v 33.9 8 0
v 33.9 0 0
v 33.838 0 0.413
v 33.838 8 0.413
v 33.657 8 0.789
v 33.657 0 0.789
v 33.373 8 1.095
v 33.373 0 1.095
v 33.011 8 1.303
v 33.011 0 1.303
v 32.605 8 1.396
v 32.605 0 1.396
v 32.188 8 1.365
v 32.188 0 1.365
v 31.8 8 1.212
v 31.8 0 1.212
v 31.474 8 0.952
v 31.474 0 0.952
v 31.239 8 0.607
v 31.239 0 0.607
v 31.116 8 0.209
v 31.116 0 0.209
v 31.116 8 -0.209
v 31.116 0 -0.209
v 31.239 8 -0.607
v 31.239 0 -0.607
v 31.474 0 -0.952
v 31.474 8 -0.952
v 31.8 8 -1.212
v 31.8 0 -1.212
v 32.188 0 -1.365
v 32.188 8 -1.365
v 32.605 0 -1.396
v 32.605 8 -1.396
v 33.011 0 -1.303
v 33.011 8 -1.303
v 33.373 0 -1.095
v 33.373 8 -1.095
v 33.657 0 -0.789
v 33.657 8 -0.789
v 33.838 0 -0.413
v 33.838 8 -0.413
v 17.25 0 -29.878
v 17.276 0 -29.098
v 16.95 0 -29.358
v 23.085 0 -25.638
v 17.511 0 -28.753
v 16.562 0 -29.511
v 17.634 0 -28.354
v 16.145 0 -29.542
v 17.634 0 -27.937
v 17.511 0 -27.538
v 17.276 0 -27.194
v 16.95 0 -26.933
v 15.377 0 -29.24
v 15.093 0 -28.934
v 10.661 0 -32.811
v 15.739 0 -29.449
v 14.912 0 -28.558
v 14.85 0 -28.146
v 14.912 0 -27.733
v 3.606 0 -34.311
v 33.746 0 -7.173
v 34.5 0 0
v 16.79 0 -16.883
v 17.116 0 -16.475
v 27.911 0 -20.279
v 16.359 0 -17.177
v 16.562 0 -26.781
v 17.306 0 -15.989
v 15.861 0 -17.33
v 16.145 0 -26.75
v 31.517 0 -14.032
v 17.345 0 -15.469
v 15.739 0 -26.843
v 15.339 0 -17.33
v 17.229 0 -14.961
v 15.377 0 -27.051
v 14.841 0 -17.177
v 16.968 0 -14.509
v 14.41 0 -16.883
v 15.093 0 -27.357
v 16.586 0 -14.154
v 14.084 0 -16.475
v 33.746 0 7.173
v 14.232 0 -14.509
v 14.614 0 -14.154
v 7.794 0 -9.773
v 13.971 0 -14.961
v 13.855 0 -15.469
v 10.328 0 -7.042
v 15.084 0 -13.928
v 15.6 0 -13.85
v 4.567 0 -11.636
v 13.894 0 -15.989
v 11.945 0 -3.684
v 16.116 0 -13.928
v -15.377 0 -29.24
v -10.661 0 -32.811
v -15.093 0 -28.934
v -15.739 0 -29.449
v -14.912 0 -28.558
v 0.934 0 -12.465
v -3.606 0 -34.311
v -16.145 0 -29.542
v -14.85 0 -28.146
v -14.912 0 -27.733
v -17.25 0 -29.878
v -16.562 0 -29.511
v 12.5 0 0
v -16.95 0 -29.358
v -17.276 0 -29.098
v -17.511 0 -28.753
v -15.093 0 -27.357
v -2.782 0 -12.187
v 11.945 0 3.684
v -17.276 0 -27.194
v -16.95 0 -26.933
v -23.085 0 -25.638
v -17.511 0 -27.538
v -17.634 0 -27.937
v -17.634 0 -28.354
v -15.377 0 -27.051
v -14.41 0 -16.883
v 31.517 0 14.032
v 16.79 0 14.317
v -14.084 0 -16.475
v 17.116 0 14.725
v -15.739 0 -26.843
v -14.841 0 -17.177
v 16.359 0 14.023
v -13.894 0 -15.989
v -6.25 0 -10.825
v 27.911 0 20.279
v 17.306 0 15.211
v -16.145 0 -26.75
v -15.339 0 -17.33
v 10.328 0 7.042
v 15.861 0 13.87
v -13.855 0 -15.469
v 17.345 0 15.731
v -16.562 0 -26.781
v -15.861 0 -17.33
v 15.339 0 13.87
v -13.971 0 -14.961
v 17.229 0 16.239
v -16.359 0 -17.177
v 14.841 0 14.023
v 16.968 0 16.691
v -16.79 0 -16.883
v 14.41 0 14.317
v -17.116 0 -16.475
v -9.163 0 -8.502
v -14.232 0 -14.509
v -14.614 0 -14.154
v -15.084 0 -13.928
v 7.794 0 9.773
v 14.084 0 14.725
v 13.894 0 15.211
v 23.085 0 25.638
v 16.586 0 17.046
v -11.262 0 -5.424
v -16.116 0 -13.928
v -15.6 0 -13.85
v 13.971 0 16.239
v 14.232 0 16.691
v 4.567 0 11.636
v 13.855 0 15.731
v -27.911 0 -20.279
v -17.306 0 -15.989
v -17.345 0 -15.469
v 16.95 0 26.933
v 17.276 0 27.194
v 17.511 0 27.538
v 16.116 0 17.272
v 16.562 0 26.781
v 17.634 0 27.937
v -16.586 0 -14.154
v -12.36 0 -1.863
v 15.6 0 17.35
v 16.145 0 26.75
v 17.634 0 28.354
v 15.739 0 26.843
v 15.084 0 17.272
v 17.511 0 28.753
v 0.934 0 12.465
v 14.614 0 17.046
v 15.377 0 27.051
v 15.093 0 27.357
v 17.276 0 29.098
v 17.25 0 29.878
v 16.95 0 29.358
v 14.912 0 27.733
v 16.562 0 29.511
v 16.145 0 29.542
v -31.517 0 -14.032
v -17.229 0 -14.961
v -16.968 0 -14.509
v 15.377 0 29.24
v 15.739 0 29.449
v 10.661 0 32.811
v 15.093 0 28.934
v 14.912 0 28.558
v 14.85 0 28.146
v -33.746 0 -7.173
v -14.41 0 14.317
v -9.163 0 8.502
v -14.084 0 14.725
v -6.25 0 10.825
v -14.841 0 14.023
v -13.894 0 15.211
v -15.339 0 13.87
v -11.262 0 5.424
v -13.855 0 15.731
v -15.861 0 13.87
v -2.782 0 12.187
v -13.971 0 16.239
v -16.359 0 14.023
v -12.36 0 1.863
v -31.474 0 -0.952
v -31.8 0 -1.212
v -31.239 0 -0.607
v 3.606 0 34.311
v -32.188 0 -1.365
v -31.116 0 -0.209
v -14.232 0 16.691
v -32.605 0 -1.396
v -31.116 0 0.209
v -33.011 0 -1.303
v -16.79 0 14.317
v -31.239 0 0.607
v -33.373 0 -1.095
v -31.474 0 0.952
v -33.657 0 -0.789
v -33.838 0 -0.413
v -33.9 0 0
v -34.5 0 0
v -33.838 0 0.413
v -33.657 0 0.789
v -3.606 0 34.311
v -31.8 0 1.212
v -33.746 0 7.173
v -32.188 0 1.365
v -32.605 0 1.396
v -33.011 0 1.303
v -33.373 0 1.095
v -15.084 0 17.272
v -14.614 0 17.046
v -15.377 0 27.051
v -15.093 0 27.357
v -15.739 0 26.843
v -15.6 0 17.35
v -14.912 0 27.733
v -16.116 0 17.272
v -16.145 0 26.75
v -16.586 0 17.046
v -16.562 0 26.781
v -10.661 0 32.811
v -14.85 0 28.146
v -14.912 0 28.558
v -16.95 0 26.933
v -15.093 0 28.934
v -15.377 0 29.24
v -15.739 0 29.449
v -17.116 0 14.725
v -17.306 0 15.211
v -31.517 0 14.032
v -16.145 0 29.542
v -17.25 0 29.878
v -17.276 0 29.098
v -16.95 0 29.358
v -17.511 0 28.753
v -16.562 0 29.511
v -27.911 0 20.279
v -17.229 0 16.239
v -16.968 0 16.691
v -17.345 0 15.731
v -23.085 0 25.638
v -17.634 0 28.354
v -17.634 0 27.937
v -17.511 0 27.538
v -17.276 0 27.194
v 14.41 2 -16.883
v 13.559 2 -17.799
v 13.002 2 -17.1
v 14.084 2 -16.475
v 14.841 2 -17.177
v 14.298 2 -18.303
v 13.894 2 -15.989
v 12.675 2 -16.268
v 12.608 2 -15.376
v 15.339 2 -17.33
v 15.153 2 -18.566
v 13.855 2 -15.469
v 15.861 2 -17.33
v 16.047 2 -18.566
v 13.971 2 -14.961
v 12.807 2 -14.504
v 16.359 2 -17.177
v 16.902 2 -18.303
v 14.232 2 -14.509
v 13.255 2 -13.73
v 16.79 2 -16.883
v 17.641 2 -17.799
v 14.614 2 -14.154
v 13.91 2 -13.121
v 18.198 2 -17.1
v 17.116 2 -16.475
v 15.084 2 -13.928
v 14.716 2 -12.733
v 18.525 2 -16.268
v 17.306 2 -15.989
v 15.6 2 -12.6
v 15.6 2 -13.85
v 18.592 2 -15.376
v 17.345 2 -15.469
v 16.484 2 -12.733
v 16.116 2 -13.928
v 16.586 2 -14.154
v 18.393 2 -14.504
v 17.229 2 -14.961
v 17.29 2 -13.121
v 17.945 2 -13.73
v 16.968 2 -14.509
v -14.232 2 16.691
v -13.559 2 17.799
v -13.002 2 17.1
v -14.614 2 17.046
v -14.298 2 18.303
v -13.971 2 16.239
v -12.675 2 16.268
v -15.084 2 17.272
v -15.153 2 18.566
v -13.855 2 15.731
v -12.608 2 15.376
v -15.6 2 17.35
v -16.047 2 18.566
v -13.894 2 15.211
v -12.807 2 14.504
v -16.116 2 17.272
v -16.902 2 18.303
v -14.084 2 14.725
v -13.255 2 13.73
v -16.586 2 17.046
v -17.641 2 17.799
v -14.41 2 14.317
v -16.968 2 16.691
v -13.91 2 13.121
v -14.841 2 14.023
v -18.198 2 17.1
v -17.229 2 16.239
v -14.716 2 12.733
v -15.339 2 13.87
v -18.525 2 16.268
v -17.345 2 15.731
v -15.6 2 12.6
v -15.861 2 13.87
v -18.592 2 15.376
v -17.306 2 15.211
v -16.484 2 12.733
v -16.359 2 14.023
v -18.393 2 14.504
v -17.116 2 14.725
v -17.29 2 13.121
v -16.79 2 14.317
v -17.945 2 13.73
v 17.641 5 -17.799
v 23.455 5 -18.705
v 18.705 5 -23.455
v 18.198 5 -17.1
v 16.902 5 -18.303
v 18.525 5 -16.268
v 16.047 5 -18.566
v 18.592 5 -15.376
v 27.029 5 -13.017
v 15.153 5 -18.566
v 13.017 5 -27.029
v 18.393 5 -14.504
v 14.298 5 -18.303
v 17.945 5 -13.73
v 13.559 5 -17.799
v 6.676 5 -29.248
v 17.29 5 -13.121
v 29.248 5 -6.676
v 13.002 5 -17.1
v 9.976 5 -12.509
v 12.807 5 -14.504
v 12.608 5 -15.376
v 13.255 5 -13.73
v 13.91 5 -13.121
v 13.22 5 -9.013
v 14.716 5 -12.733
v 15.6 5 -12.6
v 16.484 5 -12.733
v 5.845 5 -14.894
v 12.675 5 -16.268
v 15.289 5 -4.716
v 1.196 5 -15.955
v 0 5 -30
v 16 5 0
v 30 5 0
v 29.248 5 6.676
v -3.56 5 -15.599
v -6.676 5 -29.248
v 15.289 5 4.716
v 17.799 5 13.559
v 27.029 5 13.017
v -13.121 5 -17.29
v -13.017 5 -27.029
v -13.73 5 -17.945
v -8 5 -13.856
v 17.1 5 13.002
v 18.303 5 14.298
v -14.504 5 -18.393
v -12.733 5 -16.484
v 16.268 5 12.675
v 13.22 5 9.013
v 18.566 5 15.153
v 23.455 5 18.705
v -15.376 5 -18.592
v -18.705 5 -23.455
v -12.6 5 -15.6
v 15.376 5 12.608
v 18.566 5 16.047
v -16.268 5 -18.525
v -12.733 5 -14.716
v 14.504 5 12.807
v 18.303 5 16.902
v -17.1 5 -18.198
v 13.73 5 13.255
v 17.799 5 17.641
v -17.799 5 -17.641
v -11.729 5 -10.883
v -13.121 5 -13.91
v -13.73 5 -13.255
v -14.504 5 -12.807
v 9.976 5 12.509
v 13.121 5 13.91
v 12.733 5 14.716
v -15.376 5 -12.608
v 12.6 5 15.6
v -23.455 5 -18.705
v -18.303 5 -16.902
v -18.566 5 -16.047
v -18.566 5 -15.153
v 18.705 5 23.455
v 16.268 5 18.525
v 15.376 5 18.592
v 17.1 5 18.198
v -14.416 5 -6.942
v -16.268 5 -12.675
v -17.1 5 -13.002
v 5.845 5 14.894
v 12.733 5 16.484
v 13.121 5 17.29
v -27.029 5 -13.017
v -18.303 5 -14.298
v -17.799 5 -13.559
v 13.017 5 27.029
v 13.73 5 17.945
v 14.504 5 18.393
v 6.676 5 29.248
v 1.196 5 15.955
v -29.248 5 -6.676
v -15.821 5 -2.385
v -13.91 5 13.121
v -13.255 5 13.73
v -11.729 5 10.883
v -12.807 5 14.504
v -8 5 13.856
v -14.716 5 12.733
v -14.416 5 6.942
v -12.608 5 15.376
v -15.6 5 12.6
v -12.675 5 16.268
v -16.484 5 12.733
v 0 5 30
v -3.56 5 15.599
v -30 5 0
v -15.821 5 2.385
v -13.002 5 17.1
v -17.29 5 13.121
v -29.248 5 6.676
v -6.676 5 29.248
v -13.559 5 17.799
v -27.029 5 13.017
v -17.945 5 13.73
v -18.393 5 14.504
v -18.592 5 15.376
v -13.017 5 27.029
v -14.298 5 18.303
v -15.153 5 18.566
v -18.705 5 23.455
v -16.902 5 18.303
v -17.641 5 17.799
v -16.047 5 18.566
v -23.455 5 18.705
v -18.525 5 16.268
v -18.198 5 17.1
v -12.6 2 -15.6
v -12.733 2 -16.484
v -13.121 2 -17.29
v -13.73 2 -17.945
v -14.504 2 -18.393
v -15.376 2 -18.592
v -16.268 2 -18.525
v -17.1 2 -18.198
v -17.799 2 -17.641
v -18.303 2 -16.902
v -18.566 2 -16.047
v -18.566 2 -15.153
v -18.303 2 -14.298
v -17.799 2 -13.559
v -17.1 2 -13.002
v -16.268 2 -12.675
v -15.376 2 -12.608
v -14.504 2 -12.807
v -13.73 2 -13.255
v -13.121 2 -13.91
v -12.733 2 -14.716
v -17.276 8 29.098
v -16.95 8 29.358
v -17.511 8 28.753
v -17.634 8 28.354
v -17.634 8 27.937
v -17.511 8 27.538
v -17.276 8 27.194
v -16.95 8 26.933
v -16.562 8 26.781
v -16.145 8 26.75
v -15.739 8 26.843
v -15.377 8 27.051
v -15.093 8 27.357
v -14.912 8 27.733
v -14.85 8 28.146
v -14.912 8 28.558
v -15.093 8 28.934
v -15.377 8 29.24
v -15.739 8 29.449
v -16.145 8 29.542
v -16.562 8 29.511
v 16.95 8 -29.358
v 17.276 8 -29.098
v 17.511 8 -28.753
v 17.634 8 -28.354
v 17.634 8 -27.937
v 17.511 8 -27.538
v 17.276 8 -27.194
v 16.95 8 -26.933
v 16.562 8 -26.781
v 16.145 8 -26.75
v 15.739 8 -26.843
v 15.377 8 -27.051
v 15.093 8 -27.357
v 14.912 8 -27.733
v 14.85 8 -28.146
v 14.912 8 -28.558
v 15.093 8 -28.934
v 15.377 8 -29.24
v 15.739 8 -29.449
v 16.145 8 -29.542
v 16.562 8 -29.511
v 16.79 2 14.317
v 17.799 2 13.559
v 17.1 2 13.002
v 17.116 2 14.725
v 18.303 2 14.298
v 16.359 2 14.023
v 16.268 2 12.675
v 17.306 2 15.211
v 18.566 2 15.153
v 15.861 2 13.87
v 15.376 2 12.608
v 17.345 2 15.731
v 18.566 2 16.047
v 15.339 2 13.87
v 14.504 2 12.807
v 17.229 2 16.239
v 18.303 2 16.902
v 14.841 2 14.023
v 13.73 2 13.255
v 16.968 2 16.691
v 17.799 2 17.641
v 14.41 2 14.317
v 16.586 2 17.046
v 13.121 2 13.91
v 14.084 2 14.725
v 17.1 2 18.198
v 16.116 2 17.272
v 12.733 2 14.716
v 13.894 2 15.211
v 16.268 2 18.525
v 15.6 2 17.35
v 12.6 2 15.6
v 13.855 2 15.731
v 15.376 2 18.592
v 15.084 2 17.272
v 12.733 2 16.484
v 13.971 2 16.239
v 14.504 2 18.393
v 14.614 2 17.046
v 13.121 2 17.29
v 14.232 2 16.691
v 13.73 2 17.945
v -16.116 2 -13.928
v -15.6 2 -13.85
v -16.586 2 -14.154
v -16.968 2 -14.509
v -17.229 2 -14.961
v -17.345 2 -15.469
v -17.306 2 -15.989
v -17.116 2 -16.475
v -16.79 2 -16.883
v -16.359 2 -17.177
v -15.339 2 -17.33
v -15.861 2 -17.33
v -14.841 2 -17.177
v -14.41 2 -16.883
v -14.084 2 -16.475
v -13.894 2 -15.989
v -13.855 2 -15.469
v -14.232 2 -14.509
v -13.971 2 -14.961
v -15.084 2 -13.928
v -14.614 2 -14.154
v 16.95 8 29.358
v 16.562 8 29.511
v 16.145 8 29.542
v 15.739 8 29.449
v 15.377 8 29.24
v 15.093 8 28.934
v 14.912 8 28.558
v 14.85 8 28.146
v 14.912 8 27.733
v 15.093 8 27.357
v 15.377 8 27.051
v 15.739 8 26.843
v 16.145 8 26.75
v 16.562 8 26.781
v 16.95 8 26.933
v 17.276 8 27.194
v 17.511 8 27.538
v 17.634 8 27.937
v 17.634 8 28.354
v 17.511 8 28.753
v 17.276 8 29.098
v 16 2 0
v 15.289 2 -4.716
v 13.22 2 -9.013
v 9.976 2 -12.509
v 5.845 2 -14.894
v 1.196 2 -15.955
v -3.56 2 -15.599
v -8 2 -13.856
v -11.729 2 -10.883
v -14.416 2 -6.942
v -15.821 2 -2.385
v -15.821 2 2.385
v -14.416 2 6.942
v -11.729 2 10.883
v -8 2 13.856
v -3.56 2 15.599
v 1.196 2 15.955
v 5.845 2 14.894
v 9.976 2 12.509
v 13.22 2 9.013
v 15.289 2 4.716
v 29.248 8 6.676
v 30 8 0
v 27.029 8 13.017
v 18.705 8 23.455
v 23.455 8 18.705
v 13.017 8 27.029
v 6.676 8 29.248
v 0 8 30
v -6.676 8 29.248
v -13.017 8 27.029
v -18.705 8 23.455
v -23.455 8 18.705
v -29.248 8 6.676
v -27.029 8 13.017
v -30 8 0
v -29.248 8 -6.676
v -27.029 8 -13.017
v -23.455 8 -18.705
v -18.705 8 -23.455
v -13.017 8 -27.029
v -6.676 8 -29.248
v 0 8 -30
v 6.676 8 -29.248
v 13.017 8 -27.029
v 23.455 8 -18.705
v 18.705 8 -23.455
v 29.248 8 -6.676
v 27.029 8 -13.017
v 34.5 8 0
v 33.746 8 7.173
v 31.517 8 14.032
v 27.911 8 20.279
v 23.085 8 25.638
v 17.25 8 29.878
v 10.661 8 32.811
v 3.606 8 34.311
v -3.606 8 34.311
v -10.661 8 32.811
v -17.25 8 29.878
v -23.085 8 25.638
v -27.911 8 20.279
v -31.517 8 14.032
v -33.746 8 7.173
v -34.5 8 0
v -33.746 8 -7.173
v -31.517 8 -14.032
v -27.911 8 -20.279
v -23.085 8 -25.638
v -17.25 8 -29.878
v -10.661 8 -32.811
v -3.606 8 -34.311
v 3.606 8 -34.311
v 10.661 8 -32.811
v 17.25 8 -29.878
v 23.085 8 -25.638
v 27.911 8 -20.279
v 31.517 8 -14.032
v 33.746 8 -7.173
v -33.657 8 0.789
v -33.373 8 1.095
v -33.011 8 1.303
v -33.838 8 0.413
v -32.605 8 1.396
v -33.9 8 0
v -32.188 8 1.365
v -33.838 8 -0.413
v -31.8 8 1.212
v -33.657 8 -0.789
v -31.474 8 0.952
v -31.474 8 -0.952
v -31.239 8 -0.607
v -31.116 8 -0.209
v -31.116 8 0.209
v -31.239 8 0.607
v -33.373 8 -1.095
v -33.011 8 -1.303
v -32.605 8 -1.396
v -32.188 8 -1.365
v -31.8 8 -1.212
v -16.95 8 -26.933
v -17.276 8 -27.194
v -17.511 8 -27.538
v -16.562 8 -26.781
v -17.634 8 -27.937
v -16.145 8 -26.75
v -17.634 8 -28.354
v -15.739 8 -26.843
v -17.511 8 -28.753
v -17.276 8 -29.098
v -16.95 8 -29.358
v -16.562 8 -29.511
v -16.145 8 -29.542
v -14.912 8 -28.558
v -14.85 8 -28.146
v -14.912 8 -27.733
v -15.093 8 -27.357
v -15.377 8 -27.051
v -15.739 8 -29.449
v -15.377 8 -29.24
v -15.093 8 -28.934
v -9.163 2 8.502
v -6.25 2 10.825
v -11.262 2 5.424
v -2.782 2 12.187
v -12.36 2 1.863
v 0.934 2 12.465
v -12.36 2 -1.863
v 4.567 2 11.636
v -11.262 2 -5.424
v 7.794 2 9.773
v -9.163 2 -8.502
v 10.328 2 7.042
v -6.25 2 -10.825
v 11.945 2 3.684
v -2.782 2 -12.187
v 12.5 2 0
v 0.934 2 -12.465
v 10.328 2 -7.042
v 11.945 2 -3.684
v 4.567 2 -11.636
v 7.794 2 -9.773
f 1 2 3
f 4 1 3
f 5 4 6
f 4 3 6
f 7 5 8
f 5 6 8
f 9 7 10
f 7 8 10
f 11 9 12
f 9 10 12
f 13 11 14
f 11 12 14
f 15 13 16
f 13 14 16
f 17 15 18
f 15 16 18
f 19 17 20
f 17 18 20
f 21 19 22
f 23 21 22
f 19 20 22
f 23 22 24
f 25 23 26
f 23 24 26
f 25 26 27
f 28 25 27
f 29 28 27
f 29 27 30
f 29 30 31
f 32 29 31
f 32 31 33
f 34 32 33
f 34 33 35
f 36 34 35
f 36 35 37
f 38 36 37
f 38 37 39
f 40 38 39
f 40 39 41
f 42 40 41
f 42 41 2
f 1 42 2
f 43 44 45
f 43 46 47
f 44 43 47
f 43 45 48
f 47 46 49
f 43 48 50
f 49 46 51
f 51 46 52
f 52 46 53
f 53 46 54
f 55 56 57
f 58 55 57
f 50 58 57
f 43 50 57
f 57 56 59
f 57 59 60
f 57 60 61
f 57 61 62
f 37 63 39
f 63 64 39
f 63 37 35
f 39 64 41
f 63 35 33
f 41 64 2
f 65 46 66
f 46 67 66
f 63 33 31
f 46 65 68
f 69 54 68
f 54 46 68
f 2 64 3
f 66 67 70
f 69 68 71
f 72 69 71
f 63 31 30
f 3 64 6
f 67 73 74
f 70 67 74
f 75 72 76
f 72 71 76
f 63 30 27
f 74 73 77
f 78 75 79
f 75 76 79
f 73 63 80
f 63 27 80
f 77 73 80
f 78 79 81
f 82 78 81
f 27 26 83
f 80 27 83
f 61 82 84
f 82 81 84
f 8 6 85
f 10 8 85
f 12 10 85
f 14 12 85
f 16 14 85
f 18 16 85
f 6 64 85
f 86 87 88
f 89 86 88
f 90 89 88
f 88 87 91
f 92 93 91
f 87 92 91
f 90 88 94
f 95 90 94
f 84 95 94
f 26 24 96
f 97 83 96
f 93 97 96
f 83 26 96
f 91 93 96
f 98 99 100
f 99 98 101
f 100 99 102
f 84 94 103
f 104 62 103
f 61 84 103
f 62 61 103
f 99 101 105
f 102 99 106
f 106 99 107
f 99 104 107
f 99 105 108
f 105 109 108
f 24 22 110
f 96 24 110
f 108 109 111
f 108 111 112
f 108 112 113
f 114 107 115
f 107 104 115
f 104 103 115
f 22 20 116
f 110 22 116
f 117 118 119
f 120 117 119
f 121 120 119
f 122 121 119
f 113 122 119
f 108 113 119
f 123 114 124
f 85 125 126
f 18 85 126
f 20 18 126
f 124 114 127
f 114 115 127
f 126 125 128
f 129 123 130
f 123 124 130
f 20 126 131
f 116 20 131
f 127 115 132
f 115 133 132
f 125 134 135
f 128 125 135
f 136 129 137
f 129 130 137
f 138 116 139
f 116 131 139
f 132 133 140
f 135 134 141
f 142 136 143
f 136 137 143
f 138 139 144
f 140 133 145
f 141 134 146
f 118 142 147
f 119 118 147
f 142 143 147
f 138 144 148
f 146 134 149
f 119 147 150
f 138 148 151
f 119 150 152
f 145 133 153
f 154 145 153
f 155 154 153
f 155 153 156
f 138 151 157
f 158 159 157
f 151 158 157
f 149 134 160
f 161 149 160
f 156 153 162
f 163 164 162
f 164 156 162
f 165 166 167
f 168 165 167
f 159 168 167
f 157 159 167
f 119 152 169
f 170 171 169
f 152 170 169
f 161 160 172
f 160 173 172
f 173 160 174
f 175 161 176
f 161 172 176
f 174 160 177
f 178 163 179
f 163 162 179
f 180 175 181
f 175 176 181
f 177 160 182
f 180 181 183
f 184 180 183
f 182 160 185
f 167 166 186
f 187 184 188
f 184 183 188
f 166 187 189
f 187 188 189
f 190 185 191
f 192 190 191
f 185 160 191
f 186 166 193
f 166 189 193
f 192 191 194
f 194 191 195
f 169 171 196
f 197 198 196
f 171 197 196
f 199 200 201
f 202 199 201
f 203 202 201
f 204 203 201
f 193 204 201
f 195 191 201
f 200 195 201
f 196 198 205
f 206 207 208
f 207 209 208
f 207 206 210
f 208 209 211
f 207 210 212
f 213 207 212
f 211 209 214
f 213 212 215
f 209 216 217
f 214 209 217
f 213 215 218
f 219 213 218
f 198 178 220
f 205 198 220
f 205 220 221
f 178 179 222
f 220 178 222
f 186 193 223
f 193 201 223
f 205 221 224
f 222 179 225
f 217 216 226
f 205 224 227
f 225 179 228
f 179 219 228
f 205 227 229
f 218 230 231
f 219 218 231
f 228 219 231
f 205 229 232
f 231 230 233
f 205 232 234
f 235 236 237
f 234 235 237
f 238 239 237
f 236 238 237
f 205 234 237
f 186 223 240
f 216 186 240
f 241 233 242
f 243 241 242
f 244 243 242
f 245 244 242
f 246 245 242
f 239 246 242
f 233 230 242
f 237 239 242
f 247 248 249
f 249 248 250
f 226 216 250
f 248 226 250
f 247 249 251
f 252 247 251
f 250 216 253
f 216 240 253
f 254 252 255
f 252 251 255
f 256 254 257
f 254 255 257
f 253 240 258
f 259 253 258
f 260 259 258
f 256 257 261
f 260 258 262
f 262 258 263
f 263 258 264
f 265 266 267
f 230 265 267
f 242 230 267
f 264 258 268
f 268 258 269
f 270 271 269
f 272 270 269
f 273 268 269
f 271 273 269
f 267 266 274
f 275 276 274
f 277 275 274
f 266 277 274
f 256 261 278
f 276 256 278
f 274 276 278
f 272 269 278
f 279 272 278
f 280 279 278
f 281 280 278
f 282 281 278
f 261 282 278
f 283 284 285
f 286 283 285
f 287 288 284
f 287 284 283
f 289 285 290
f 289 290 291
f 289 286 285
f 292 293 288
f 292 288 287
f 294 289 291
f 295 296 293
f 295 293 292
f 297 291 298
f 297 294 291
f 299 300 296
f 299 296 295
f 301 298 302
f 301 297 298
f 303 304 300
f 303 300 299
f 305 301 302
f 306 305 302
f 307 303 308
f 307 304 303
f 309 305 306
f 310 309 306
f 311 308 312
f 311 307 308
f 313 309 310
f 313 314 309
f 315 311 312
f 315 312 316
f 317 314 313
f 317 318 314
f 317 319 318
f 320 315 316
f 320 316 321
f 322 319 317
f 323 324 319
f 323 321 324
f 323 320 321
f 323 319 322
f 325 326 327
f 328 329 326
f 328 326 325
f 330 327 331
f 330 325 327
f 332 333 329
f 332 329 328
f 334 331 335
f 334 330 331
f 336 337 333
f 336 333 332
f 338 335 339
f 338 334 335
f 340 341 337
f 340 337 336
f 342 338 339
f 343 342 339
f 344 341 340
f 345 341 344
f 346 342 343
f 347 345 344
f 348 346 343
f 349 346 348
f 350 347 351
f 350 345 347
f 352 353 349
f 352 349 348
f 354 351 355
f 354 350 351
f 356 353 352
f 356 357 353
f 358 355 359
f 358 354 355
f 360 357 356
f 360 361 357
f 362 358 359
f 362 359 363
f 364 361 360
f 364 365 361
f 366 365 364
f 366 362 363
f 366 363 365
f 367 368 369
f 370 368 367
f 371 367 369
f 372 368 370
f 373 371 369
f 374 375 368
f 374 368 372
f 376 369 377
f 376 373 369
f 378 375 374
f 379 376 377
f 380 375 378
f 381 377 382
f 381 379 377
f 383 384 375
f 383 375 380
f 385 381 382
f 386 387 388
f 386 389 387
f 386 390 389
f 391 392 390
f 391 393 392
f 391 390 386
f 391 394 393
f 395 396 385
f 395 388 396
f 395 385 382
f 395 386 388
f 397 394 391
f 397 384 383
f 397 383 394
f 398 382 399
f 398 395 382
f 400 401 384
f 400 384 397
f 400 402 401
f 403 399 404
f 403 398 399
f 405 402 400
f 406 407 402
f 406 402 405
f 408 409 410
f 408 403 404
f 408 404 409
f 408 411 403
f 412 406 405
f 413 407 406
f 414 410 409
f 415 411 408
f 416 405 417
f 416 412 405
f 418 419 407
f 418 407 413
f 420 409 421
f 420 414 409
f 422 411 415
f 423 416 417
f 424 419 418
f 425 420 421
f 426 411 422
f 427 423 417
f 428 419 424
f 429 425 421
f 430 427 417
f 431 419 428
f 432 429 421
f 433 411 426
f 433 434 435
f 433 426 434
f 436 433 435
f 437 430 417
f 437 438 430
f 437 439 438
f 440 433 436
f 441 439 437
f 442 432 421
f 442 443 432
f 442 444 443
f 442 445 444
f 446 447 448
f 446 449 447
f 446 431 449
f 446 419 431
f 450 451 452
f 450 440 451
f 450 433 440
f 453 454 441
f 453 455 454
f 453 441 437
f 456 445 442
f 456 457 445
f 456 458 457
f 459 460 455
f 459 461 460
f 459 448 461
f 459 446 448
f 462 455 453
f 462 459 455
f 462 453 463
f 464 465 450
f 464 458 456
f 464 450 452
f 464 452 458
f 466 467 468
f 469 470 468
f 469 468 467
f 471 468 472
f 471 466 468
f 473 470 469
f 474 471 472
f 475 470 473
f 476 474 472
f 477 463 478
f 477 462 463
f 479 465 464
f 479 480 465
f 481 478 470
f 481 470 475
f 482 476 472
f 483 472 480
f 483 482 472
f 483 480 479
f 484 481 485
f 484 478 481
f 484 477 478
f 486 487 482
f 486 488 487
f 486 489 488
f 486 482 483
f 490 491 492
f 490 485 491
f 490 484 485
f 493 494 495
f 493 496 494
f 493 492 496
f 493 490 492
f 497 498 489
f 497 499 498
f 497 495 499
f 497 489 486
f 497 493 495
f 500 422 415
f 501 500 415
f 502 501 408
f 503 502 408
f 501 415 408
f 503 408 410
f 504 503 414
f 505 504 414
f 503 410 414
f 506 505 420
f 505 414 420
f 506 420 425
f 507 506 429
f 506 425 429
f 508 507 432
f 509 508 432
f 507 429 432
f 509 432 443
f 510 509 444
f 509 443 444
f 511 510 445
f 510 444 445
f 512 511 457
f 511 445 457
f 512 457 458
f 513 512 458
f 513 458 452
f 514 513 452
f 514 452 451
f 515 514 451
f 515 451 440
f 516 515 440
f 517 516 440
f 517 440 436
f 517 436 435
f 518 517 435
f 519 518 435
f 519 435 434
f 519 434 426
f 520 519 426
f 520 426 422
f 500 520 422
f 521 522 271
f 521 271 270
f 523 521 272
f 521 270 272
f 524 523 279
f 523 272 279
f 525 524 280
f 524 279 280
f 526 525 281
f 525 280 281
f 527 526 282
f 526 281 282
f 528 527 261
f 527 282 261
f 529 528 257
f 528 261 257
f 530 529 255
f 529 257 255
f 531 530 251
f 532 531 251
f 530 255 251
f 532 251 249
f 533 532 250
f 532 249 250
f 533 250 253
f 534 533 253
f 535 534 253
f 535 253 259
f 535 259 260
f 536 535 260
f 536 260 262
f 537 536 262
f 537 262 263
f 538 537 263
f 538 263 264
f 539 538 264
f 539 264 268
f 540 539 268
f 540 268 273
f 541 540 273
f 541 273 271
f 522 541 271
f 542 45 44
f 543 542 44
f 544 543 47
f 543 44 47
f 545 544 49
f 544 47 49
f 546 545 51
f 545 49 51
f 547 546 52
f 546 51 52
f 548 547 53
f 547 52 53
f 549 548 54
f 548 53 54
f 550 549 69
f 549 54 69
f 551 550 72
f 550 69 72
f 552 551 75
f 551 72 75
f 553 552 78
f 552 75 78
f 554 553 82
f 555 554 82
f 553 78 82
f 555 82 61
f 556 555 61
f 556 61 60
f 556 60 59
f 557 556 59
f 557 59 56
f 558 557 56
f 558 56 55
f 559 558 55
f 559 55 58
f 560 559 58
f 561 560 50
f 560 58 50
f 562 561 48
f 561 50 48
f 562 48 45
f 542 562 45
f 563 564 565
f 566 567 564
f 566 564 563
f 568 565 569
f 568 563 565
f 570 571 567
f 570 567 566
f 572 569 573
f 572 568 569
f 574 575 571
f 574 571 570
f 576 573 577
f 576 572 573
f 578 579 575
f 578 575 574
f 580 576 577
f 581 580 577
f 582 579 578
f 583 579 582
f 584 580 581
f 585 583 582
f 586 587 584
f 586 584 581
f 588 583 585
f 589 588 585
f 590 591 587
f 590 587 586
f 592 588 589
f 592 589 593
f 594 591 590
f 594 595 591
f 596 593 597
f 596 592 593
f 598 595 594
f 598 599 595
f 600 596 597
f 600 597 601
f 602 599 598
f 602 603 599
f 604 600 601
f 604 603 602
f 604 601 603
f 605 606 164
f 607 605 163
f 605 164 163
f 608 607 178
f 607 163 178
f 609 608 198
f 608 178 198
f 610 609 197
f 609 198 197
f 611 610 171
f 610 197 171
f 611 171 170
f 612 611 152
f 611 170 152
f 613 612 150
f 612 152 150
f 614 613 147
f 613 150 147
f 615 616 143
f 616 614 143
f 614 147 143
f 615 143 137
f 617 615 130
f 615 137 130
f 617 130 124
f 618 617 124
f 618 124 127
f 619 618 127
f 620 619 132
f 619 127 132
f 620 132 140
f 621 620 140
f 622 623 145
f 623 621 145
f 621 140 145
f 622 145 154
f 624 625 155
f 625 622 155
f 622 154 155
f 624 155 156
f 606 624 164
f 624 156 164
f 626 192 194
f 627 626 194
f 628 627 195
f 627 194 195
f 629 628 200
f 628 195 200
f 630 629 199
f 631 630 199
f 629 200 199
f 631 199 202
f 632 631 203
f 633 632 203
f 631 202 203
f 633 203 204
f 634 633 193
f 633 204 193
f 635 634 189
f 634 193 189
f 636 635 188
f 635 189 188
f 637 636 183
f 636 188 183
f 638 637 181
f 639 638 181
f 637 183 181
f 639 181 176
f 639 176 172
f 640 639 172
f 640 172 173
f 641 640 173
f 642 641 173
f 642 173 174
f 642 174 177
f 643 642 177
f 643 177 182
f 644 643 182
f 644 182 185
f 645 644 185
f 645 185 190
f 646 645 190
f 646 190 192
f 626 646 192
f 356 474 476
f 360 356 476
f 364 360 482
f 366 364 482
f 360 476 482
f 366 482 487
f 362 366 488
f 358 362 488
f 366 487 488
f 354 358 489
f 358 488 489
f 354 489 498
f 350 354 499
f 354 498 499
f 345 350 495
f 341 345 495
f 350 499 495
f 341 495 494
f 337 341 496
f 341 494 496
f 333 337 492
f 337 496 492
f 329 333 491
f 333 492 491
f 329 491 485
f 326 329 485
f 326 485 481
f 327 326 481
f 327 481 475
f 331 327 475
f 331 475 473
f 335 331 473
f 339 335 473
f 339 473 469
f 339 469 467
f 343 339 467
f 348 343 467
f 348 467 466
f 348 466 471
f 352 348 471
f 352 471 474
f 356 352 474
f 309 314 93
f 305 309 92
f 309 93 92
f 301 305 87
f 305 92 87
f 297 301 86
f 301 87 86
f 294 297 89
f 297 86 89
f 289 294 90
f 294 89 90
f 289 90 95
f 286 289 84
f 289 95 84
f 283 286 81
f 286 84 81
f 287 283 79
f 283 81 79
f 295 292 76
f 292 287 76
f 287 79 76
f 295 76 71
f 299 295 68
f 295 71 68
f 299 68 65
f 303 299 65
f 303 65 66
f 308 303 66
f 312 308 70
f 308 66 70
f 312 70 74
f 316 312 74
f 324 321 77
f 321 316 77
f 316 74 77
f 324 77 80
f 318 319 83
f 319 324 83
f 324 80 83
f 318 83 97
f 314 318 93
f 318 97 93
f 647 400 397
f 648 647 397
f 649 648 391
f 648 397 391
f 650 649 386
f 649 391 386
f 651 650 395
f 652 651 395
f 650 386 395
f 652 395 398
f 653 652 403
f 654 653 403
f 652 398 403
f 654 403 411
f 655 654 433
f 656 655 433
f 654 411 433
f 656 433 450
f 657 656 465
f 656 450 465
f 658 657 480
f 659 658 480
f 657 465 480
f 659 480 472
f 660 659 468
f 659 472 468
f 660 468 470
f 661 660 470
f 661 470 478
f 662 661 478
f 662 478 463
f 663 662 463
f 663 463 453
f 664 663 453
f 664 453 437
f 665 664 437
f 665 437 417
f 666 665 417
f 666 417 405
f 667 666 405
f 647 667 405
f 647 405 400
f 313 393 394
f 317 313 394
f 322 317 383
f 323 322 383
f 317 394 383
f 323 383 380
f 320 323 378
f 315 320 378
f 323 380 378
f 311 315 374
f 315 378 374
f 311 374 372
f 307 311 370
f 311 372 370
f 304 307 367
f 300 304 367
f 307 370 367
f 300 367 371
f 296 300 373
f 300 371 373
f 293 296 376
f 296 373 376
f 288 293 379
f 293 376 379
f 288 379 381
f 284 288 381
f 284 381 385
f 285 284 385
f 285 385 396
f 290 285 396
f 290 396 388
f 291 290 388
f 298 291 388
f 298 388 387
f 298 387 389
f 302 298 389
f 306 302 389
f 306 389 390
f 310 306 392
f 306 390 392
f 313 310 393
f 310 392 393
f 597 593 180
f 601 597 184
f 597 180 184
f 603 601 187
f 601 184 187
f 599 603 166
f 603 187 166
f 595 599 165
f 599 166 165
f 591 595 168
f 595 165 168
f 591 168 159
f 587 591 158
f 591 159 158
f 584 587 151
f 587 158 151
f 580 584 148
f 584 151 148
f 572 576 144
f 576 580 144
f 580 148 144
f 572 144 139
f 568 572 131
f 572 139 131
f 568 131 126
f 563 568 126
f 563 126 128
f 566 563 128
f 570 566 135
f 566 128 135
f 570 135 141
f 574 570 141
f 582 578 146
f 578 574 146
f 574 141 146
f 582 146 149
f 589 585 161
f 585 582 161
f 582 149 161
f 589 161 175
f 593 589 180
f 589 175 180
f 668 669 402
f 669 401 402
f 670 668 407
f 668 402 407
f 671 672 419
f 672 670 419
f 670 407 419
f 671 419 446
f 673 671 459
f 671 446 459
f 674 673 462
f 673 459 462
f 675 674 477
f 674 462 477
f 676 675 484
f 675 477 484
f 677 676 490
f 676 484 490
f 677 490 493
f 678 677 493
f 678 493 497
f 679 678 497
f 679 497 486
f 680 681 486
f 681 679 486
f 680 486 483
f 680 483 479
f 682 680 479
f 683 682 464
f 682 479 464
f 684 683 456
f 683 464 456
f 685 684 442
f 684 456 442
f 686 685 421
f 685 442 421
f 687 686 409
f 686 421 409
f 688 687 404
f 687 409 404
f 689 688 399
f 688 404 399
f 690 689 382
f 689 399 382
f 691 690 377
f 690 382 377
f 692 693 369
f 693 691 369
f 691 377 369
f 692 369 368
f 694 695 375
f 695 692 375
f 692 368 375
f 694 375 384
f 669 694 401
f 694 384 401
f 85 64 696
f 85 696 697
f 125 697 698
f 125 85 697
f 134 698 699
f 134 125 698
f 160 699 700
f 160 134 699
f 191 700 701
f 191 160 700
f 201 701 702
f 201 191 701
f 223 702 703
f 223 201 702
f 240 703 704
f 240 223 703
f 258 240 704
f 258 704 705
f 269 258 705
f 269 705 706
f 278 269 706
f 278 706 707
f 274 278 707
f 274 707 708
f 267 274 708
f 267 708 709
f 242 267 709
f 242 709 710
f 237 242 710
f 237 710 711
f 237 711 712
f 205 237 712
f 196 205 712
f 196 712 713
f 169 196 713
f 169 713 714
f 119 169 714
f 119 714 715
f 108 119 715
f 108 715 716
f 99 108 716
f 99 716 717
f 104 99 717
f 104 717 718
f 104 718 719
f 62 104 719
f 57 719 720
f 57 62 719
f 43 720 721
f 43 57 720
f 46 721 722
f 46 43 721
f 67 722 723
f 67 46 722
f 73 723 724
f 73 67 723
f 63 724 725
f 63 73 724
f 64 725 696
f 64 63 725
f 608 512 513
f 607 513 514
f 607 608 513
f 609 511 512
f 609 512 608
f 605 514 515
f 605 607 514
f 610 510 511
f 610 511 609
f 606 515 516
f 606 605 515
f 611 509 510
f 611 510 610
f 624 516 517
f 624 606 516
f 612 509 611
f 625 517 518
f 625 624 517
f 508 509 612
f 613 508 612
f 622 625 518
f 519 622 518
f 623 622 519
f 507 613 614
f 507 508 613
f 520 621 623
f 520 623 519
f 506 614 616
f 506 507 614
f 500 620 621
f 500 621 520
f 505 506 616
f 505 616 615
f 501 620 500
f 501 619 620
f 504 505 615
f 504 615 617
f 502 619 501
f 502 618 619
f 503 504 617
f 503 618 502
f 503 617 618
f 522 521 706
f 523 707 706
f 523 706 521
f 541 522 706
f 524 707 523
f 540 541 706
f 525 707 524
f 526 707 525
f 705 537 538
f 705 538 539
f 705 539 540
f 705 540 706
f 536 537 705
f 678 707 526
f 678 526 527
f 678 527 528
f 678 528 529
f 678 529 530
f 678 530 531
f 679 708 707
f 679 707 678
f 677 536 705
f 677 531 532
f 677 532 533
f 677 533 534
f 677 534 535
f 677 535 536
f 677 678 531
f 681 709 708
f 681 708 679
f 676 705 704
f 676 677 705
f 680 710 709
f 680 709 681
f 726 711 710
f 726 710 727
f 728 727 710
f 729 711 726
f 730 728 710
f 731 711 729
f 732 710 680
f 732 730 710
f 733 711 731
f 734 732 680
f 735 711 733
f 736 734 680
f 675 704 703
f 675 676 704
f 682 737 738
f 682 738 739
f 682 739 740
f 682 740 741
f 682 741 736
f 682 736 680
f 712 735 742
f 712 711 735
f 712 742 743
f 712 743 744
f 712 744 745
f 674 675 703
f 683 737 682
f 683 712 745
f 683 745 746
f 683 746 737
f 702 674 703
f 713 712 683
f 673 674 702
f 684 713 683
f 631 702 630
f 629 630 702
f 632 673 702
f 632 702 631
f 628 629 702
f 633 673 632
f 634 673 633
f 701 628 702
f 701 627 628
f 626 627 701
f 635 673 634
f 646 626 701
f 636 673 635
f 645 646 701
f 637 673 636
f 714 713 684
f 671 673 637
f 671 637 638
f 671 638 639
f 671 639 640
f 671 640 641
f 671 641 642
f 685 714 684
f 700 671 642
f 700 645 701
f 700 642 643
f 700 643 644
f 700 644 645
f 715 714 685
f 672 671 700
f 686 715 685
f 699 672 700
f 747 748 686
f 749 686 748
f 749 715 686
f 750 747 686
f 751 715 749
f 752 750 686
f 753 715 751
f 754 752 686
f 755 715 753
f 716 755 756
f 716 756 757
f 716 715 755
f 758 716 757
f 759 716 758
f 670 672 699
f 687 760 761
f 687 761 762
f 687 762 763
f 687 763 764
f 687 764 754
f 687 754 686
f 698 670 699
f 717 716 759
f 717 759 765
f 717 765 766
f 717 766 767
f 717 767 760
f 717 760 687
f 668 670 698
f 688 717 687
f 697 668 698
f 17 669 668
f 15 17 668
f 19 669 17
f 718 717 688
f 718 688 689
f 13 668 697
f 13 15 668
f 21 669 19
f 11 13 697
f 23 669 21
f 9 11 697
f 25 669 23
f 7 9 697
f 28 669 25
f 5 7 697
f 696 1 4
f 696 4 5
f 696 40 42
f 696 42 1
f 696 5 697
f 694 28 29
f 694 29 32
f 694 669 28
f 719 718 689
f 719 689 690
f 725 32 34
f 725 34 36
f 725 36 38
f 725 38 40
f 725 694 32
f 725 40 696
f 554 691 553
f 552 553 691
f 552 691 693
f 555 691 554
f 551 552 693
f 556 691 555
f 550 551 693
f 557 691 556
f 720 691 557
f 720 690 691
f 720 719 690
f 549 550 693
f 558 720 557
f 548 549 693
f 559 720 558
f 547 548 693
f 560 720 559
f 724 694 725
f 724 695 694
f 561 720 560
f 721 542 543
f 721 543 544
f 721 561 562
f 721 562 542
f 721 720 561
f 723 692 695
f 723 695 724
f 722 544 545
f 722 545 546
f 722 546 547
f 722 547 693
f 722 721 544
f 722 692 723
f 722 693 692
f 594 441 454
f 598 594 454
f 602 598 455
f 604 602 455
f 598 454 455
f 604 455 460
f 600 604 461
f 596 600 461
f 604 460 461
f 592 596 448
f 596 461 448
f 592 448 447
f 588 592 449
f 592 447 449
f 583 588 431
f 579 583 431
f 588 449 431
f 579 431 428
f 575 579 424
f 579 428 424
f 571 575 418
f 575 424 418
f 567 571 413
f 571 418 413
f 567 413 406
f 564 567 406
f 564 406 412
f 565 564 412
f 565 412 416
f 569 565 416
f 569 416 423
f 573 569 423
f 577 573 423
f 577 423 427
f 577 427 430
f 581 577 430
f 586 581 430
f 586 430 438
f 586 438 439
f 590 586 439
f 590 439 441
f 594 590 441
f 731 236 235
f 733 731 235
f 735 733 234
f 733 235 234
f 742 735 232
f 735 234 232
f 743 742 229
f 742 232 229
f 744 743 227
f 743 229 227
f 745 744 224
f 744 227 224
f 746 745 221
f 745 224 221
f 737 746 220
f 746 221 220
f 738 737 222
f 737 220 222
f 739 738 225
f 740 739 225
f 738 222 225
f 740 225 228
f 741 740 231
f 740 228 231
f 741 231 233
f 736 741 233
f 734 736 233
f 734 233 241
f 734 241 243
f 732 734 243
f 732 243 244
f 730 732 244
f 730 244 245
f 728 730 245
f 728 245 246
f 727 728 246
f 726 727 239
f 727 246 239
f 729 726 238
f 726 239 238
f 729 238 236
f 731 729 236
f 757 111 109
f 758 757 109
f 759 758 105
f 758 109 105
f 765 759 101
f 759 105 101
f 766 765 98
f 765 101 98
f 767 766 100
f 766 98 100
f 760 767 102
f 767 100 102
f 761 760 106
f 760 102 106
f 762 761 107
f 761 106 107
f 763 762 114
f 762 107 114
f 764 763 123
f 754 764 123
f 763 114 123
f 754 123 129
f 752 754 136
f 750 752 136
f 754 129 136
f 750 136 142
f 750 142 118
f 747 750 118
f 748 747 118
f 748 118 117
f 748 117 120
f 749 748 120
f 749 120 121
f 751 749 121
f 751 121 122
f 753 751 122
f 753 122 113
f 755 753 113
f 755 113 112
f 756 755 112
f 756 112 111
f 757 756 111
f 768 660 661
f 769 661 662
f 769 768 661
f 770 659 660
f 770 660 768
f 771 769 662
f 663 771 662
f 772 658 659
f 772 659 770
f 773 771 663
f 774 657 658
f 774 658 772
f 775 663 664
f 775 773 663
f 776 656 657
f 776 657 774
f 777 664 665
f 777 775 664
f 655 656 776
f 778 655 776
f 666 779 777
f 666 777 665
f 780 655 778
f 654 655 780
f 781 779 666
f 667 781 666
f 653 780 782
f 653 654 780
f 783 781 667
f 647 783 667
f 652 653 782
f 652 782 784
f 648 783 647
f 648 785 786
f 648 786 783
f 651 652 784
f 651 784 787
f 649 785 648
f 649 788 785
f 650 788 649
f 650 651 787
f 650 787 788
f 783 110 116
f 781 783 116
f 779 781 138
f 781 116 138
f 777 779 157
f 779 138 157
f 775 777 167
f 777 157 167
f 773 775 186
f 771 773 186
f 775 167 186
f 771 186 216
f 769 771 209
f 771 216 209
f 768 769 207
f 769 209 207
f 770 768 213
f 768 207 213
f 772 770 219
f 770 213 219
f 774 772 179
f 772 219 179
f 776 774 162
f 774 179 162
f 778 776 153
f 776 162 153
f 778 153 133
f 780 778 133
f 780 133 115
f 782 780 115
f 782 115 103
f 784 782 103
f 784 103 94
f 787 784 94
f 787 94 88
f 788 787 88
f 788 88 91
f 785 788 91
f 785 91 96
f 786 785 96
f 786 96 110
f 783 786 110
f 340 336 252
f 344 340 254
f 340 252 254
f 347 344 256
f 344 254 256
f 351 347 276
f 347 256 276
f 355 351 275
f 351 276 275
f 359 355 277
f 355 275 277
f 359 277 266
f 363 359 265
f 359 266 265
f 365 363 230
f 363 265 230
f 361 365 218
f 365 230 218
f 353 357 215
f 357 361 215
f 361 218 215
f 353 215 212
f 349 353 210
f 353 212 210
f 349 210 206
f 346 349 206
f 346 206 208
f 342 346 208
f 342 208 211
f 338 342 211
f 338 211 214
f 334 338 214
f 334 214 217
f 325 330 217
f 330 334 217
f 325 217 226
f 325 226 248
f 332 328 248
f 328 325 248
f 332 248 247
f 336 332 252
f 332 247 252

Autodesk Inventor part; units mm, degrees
ref_plane "YZ Plane" through (0, 0, 0) normal (1, 0, 0) x (0, 1, 0)
ref_plane "XZ Plane" through (0, 0, 0) normal (0, 1, 0) x (-1, 0, 0)
ref_plane "XY Plane" through (0, 0, 0) normal (0, 0, 1) x (1, 0, 0)
sketch "Sketch1" plane through (0, 0, 0) normal (0, 1, 0) x (-1, 0, 0)
  circle A0 centre (0, 0) radius 35
  dimension "d0" = 70
extrude "Extrusion1" add sketch "Sketch1" along normal blind 5
sketch "Sketch2" plane through (0, 5, 0) normal (0, 1, 0) x (1, 0, 0)
  circle A0 centre (0, 0) radius 30
  circle A1 centre (0, 0) radius 35
  dimension "d3" = 60
extrude "Extrusion2" add sketch "Sketch2" along normal blind 3
sketch "Sketch3" plane through (0, 0, 0) normal (0, -1, 0) x (1, 0, 0)
  circle A0 centre (32.5, 0) radius 1.4
  point P0 (0, 0)
  dimension "d8" = 32.5
  dimension "d9" = 2.8
extrude "Extrusion3" cut sketch "Sketch3" against normal up to surface (8 mm away)
pattern_circular "Circular Pattern1" count 6 over 360 about axis through (0, 0, 0) along (0, 1, 0) of "Extrusion3"
sketch "Sketch4" plane through (0, 0, 0) normal (0, -1, 0) x (1, 0, 0)
  circle A0 centre (0, 0) radius 12.5
  dimension "d15" = 25
extrude "Extrusion4" cut sketch "Sketch4" against normal up to surface (5 mm away)
sketch "Sketch5" plane through (0, 5, 0) normal (0, 1, 0) x (1, 0, 0)
  point P0 (0, 0)
  point P1 (-15.6, 15.6)
  point P2 (15.6, 15.6)
  point P3 (15.6, -15.6)
  point P4 (-15.6, -15.6)
  dimension "d18" = 15.6
  dimension "d19" = 15.6
  dimension "d33" = 15.6
  dimension "d34" = 15.6
hole "Hole1" at (-15.6, 5, -15.6) at (15.6, 5, -15.6) at (15.6, 5, 15.6) at (-15.6, 5, 15.6) direction (0, -1, 0) diameter 3.5 end through all
sketch "Sketch6" plane through (0, 5, 0) normal (0, 1, 0) x (1, 0, 0)
  circle A0 centre (-15.6, 15.6) radius 1.75 projected
  circle A1 centre (-15.6, 15.6) radius 3
  point P0 (0, 0)
  dimension "d27" = 6
extrude "Extrusion5" cut sketch "Sketch6" against normal blind 3
pattern_circular "Circular Pattern2" count 4 over 360 about axis through (0, 0, 0) along (0, 1, 0) of "Extrusion5"
sketch "Sketch7" plane through (0, 5, 0) normal (0, 1, 0) x (1, 0, 0)
  circle A0 centre (0, 0) radius 16
  dimension "d35" = 32
extrude "Extrusion6" cut sketch "Sketch7" against normal blind 3
sketch "Sketch8" plane through (0, 0, 0) normal (0, -1, 0) x (1, 0, 0)
  circle A0 centre (0, 0) radius 35
  circle A1 centre (0, 0) radius 34.5
  dimension "d38" = 70
  dimension "d39" = 69
extrude "Extrusion7" cut sketch "Sketch8" against normal up to surface (8 mm away)
properties part number "Top_3DPrint"
